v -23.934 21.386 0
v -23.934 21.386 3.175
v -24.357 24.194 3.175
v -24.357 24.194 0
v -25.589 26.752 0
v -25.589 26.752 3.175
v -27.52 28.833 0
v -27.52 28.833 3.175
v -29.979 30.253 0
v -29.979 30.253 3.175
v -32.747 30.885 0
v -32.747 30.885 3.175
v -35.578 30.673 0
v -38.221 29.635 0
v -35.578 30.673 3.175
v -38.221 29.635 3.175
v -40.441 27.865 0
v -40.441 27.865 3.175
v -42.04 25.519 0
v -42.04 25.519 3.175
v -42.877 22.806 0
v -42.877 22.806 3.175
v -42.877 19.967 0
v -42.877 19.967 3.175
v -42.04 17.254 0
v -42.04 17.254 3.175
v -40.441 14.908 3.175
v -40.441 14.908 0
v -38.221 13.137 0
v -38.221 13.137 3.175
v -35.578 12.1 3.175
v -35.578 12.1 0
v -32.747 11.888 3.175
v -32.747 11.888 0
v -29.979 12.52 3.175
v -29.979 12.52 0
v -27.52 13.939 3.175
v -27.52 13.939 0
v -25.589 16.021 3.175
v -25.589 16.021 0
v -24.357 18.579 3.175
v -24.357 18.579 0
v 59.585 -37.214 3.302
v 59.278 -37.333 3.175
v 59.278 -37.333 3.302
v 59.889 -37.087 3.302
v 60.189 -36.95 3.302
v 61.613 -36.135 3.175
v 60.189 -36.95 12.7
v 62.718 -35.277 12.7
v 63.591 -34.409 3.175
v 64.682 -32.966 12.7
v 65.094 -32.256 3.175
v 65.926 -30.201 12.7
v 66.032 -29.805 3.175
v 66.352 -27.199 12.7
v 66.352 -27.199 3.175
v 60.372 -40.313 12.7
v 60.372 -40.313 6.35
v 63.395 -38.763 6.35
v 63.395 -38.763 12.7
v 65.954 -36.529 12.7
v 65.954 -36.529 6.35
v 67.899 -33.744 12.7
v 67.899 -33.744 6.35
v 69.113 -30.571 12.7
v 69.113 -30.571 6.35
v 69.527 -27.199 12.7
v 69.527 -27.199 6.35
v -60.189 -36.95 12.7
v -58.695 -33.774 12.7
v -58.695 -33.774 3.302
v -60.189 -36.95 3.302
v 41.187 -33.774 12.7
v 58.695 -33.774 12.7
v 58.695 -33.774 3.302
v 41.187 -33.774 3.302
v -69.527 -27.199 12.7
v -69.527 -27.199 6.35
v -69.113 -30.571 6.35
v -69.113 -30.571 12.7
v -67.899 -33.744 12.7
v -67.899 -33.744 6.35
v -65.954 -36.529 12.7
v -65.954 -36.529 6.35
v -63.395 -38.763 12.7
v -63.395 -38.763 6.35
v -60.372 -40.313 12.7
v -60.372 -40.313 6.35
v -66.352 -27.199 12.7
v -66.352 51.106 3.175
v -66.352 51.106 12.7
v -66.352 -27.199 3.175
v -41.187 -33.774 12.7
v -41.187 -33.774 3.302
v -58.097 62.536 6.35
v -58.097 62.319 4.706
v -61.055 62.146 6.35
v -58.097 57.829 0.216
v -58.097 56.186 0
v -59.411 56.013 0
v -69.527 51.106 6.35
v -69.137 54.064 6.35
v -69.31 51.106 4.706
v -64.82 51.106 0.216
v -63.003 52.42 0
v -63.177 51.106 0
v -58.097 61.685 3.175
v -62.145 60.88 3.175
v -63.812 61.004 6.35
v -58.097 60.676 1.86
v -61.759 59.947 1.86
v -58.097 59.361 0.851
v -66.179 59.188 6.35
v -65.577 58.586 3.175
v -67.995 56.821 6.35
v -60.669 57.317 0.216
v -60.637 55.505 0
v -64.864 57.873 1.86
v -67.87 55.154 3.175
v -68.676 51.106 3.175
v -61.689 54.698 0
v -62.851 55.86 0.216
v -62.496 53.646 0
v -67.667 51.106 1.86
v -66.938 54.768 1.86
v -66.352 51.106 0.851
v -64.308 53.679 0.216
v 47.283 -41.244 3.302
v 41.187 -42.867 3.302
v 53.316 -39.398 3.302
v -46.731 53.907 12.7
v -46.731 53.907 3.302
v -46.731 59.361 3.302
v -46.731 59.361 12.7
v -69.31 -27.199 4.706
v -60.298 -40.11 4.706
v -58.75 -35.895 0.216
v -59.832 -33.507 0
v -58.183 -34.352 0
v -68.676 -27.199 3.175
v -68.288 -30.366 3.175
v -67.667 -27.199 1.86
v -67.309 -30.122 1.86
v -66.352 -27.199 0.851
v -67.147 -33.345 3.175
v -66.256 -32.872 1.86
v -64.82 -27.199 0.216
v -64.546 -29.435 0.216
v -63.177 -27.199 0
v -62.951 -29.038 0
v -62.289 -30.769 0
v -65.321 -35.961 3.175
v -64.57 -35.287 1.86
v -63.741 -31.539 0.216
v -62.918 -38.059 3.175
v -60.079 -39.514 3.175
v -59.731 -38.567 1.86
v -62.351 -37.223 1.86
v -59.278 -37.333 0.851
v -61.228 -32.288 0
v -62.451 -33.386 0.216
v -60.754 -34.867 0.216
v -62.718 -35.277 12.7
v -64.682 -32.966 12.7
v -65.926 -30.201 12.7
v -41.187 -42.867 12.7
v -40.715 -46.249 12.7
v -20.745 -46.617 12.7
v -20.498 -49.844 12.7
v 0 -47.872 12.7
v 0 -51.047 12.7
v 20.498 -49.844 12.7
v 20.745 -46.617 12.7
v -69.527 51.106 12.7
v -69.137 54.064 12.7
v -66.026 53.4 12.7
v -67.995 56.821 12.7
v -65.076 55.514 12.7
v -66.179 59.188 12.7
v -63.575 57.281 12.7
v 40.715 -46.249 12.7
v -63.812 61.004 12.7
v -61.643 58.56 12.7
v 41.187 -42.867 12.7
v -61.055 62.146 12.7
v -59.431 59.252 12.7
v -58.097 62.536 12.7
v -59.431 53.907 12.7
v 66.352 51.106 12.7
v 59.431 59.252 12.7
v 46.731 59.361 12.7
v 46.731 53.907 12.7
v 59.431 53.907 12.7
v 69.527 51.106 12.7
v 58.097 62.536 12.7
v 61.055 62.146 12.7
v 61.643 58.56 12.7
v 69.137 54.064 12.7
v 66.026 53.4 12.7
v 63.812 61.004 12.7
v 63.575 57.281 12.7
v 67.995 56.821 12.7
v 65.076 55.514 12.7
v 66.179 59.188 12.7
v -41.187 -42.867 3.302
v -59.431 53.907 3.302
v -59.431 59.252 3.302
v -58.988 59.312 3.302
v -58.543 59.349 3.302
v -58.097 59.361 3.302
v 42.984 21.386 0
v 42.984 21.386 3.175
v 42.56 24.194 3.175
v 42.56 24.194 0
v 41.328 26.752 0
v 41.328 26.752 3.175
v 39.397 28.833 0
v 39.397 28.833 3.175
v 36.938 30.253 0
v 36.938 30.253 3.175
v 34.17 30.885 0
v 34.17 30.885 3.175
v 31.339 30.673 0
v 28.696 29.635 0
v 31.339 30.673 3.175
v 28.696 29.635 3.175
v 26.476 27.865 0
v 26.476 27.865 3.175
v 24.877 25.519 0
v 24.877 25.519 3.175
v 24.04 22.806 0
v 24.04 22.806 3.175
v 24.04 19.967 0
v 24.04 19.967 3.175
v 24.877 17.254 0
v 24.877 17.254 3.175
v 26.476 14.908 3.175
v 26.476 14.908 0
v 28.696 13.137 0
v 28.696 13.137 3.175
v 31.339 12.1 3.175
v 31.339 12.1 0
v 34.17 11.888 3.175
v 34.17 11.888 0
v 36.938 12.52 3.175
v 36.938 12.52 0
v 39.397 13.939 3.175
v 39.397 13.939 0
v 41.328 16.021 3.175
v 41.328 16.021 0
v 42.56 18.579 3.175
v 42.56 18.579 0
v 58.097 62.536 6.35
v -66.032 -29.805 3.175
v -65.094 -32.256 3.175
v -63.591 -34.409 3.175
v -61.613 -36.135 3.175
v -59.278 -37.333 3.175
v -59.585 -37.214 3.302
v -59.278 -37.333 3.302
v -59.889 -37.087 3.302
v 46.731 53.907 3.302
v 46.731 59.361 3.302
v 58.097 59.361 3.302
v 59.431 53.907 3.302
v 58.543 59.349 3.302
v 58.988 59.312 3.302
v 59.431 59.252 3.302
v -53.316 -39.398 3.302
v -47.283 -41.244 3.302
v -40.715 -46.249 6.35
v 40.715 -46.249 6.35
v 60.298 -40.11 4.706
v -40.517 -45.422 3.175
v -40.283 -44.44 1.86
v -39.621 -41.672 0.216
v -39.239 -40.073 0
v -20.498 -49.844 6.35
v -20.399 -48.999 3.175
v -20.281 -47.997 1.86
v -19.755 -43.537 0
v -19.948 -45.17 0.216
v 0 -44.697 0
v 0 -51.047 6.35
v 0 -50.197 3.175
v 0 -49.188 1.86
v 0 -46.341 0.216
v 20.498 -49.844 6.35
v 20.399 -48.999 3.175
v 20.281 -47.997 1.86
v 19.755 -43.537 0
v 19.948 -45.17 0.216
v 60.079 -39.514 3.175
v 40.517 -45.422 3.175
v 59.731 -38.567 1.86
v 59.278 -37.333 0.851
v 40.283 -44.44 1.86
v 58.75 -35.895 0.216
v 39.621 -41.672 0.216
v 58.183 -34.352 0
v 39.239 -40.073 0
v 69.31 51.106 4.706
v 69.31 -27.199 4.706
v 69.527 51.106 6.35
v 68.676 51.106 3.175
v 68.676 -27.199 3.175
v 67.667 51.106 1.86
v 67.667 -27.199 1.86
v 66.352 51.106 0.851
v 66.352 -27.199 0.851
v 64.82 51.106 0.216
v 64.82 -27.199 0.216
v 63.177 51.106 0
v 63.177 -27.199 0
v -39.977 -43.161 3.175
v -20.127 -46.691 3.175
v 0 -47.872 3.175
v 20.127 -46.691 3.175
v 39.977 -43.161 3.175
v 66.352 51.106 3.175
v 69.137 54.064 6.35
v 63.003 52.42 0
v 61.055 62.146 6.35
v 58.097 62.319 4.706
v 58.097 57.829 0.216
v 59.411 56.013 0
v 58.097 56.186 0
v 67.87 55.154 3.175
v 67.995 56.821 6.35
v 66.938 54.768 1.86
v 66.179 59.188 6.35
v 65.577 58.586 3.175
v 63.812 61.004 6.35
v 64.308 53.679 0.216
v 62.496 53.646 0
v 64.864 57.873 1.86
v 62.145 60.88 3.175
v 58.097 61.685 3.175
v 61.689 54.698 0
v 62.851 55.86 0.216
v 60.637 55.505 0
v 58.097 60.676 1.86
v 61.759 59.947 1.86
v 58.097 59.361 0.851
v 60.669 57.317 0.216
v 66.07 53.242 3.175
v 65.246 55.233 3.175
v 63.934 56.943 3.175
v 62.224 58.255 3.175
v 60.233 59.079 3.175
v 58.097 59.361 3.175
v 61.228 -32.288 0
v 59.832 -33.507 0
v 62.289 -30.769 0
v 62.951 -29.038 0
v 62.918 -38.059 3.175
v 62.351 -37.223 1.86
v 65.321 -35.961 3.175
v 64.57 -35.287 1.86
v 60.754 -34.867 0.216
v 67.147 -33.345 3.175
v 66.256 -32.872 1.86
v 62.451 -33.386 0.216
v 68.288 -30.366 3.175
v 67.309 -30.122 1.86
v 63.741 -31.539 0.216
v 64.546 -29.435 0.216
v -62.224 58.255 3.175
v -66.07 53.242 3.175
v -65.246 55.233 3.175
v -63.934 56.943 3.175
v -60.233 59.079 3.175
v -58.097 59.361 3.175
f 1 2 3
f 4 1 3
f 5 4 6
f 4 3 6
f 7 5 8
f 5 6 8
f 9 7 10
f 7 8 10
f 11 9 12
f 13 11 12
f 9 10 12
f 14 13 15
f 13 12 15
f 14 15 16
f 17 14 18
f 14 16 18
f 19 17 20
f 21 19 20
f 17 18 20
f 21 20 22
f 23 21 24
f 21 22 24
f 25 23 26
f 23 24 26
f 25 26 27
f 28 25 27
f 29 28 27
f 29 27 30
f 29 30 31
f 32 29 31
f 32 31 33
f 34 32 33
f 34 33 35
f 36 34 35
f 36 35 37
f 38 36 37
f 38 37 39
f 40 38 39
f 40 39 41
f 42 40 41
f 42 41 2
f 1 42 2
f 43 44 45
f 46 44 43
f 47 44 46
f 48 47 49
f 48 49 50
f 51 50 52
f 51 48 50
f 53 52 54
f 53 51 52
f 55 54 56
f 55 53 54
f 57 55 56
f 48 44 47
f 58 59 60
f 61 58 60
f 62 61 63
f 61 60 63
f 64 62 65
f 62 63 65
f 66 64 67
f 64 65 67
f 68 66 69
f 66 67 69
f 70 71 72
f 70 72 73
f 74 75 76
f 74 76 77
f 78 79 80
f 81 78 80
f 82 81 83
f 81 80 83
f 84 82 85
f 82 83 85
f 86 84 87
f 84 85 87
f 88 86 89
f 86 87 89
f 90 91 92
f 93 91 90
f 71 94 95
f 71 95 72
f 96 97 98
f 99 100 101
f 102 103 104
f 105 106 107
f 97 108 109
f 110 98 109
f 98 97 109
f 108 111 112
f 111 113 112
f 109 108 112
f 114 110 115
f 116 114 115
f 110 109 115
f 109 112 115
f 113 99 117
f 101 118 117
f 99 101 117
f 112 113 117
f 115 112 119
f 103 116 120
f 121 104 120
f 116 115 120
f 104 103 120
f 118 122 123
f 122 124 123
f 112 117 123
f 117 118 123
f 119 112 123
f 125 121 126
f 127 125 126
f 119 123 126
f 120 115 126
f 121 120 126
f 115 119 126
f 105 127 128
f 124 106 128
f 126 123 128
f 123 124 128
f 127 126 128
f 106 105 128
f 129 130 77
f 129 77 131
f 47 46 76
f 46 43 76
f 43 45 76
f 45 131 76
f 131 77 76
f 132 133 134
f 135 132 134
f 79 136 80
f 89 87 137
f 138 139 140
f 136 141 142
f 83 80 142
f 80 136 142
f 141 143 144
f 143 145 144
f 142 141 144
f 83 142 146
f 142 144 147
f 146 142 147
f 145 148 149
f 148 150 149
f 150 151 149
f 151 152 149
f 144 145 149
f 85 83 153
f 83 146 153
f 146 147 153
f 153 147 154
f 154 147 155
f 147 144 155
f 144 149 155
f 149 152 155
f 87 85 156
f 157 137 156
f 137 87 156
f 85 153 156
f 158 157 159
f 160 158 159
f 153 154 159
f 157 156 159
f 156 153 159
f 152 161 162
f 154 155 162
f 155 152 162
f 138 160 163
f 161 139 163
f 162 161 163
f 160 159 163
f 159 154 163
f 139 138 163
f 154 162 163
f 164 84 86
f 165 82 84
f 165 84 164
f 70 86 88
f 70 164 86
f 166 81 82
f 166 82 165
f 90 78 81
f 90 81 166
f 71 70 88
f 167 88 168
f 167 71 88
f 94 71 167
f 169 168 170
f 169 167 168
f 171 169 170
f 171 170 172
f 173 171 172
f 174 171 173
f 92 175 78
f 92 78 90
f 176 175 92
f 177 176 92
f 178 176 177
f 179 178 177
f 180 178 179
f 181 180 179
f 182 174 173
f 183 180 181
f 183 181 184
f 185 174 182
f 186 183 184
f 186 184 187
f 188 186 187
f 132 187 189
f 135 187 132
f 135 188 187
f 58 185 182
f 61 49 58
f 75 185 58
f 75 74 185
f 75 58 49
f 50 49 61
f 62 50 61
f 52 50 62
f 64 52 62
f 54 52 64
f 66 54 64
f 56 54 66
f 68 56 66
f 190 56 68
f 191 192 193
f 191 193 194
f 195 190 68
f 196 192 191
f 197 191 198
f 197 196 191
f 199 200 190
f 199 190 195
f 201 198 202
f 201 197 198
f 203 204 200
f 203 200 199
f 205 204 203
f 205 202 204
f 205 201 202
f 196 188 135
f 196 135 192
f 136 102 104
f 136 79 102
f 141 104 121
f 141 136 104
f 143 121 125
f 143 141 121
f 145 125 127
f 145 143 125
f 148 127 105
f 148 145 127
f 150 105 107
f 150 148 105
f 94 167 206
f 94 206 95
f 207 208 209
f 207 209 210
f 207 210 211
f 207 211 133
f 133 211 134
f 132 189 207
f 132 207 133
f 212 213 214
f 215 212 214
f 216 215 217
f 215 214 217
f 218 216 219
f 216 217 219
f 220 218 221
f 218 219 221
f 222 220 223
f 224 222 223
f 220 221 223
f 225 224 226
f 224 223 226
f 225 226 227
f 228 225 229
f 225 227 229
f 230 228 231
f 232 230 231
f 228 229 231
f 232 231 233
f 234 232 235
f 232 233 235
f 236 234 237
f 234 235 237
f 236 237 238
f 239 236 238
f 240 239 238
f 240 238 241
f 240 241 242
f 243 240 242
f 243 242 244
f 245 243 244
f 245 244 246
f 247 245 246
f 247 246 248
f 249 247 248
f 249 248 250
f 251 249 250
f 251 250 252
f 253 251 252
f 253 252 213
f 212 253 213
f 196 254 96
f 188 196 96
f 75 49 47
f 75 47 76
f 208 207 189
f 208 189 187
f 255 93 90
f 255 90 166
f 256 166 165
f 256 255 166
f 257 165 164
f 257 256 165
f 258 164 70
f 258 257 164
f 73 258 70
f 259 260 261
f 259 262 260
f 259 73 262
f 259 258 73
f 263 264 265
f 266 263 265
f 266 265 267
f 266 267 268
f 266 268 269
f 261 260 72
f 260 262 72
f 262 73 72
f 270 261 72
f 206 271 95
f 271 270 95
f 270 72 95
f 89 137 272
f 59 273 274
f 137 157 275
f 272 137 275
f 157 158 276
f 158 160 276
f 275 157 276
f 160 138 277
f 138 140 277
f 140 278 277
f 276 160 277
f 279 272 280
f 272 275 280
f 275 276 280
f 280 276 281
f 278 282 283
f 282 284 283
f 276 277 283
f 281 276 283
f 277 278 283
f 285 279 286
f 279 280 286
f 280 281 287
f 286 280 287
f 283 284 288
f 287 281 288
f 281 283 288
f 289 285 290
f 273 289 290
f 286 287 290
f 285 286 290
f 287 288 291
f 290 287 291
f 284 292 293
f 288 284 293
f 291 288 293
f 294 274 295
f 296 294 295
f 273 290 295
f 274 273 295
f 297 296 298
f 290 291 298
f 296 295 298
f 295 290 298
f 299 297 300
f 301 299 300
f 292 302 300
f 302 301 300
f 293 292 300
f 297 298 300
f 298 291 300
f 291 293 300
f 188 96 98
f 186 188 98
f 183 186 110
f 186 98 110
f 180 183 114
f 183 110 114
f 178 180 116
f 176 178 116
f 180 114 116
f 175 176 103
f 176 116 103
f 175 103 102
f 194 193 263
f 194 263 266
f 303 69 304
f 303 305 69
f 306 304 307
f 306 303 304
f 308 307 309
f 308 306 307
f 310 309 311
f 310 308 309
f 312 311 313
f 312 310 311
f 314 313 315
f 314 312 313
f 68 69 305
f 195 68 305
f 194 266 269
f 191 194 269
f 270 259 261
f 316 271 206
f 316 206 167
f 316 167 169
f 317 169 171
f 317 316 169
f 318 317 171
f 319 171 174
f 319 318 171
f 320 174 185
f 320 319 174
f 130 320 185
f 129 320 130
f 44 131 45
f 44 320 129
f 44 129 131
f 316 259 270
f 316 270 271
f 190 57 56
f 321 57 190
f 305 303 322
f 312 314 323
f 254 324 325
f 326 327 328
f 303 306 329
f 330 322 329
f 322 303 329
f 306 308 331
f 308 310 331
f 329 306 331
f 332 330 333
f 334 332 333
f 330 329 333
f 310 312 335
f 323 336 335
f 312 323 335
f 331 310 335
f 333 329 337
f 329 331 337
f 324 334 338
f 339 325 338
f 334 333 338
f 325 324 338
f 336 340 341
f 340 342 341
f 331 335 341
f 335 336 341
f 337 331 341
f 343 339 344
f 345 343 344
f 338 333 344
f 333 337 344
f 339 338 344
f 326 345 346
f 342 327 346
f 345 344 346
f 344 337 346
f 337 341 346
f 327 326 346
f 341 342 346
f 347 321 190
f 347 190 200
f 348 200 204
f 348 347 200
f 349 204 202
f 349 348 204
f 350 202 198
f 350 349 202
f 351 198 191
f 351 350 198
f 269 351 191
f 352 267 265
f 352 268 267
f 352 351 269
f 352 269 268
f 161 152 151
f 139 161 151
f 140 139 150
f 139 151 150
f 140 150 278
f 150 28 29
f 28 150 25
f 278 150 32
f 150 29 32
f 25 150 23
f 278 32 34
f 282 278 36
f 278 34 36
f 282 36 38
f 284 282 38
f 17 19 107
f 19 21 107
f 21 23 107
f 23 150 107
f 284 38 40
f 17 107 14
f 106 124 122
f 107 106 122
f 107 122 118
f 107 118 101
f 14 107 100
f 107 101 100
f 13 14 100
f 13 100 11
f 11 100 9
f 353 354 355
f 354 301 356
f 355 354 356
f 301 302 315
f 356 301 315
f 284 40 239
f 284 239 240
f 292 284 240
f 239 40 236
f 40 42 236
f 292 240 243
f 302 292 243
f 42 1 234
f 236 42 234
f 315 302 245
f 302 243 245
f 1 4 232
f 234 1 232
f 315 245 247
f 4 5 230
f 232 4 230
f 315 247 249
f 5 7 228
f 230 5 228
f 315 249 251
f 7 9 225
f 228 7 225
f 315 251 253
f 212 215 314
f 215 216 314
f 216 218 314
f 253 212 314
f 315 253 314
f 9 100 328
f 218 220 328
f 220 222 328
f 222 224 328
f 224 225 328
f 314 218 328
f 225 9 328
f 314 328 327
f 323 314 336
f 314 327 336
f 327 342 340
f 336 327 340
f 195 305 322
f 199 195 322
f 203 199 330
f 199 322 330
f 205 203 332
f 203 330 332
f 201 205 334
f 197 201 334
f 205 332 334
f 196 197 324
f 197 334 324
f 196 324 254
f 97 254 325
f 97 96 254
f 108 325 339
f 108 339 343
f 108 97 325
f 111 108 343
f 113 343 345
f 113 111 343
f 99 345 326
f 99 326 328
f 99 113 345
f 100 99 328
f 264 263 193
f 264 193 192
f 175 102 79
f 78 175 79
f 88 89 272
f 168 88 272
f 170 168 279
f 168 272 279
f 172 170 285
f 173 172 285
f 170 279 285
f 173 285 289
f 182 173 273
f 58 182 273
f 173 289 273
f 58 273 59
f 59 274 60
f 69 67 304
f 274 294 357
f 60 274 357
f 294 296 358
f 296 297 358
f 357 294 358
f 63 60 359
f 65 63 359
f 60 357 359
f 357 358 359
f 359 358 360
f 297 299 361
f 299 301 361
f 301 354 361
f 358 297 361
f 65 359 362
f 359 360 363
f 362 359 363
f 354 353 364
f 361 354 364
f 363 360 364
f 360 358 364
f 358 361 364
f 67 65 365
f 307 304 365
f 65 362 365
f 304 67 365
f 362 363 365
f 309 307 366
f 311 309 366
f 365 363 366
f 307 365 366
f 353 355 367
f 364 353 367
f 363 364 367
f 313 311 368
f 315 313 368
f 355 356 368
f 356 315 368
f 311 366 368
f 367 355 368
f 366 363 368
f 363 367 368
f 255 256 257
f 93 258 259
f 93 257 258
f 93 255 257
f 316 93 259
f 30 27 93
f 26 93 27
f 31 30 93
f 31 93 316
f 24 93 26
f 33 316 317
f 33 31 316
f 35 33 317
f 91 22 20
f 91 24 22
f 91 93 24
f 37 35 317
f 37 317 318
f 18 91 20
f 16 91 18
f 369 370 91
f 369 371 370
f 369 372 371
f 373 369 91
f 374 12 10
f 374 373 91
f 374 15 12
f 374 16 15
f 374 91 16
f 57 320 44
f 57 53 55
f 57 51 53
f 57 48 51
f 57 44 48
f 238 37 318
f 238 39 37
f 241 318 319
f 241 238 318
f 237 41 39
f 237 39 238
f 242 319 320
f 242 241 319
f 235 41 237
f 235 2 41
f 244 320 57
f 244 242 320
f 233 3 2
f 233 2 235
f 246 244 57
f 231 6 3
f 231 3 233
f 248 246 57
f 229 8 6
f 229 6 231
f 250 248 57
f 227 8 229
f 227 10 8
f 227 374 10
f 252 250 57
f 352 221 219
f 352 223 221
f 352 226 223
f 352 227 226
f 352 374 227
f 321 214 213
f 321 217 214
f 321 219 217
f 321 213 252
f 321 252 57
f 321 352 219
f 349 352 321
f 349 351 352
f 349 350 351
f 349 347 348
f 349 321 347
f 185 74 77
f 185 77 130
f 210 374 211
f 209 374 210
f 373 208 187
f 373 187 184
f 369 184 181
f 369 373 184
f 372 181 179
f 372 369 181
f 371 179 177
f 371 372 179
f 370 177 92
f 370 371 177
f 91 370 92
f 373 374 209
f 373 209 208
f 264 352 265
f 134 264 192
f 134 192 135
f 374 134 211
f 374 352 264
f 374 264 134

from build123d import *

# Parameters (mm, degrees)
F1_DEPTH = 12.7
F2_T     = -3.175
F3_R     = 6.35
F5_W     = 12.7
F5_H     = 6.35
F6_DEPTH = 9.398
F7_R     = 9.525
F8_DEPTH = 25.4


# Not quite as in the source:
# - a feature names something its author has since deleted; it is built from what else it names


with BuildPart() as f1:
    # F0 (on Top) → F1 (new body)
    with BuildSketch(Plane.XY):
        with BuildLine():
            Line((58.0965084505, 62.5356453779), (-58.0965084505, 62.5356453779))
            ThreePointArc((-58.0965084505, 62.5356453779), (-66.1787389595, 59.1878758868), (-69.5265084505, 51.1056453779))
            Line((-69.5265084505, 51.1056453779), (-69.5265084505, -27.1992570698))
            ThreePointArc((-69.5265084505, -27.1992570698), (-67.0115325937, -35.1957139026), (-60.3721316603, -40.3130159932))
            ThreePointArc((-60.3721316603, -40.3130159932), (0, -51.0474727306), (60.3721316603, -40.3130159932))
            ThreePointArc((60.3721316603, -40.3130159932), (67.0115325937, -35.1957139026), (69.5265084505, -27.1992570698))
            Line((69.5265084505, -27.1992570698), (69.5265084505, 51.1056453779))
            ThreePointArc((69.5265084505, 51.1056453779), (66.1787389595, 59.1878758868), (58.0965084505, 62.5356453779))
        make_face()
    extrude(amount=F1_DEPTH)

    # F2
    f2_openings = [f1.faces().sort_by_distance(p)[0] for p in [
        (0, 7.919531, 12.7),
    ]]
    offset(amount=F2_T, openings=f2_openings)

    # F3
    f3_edges = [f1.edges().sort_by_distance(p)[0] for p in [
        (69.526508, 11.953194, 0),
        (66.178739, 59.187876, 0),
        (0, 62.535645, 0),
        (-66.178739, 59.187876, 0),
        (-69.526508, 11.953194, 0),
        (-67.011533, -35.195714, 0),
        (0, -51.047473, 0),
        (67.011533, -35.195714, 0),
    ]]
    fillet(f3_edges, radius=F3_R)

    # F5 (on offset) → F6 (join)
    with BuildSketch(Plane.XY.offset(12.7)):
        with Locations((-53.0805146158, 57.0815077901)):
            Rectangle(F5_W, F5_H)
        with Locations((53.0805146158, 57.0815077901)):
            Rectangle(F5_W, F5_H)
        Polygon((-41.1868803203, -33.773638308), (-58.6946308613, -33.773638308), (-60.6418885291, -37.9110425711), (-53.9016760886, -40.266495198), (-41.1868803203, -43.3214269578), align=None)
        Polygon((60.6418885291, -37.9110425711), (58.6946308613, -33.773638308), (41.1868803203, -33.773638308), (41.1868803203, -43.3214269578), (53.9016760886, -40.266495198), align=None)
    extrude(amount=-F6_DEPTH)

    # F7 (on face) → F8 (cut)
    with BuildSketch(Plane.XY.offset(3.175)):
        with Locations((-33.4585084505, 21.3863216341)):
            Circle(F7_R)
        with Locations((33.4585084505, 21.3863216341)):
            Circle(F7_R)
    extrude(amount=-F8_DEPTH, mode=Mode.SUBTRACT)


solid = f1.part
